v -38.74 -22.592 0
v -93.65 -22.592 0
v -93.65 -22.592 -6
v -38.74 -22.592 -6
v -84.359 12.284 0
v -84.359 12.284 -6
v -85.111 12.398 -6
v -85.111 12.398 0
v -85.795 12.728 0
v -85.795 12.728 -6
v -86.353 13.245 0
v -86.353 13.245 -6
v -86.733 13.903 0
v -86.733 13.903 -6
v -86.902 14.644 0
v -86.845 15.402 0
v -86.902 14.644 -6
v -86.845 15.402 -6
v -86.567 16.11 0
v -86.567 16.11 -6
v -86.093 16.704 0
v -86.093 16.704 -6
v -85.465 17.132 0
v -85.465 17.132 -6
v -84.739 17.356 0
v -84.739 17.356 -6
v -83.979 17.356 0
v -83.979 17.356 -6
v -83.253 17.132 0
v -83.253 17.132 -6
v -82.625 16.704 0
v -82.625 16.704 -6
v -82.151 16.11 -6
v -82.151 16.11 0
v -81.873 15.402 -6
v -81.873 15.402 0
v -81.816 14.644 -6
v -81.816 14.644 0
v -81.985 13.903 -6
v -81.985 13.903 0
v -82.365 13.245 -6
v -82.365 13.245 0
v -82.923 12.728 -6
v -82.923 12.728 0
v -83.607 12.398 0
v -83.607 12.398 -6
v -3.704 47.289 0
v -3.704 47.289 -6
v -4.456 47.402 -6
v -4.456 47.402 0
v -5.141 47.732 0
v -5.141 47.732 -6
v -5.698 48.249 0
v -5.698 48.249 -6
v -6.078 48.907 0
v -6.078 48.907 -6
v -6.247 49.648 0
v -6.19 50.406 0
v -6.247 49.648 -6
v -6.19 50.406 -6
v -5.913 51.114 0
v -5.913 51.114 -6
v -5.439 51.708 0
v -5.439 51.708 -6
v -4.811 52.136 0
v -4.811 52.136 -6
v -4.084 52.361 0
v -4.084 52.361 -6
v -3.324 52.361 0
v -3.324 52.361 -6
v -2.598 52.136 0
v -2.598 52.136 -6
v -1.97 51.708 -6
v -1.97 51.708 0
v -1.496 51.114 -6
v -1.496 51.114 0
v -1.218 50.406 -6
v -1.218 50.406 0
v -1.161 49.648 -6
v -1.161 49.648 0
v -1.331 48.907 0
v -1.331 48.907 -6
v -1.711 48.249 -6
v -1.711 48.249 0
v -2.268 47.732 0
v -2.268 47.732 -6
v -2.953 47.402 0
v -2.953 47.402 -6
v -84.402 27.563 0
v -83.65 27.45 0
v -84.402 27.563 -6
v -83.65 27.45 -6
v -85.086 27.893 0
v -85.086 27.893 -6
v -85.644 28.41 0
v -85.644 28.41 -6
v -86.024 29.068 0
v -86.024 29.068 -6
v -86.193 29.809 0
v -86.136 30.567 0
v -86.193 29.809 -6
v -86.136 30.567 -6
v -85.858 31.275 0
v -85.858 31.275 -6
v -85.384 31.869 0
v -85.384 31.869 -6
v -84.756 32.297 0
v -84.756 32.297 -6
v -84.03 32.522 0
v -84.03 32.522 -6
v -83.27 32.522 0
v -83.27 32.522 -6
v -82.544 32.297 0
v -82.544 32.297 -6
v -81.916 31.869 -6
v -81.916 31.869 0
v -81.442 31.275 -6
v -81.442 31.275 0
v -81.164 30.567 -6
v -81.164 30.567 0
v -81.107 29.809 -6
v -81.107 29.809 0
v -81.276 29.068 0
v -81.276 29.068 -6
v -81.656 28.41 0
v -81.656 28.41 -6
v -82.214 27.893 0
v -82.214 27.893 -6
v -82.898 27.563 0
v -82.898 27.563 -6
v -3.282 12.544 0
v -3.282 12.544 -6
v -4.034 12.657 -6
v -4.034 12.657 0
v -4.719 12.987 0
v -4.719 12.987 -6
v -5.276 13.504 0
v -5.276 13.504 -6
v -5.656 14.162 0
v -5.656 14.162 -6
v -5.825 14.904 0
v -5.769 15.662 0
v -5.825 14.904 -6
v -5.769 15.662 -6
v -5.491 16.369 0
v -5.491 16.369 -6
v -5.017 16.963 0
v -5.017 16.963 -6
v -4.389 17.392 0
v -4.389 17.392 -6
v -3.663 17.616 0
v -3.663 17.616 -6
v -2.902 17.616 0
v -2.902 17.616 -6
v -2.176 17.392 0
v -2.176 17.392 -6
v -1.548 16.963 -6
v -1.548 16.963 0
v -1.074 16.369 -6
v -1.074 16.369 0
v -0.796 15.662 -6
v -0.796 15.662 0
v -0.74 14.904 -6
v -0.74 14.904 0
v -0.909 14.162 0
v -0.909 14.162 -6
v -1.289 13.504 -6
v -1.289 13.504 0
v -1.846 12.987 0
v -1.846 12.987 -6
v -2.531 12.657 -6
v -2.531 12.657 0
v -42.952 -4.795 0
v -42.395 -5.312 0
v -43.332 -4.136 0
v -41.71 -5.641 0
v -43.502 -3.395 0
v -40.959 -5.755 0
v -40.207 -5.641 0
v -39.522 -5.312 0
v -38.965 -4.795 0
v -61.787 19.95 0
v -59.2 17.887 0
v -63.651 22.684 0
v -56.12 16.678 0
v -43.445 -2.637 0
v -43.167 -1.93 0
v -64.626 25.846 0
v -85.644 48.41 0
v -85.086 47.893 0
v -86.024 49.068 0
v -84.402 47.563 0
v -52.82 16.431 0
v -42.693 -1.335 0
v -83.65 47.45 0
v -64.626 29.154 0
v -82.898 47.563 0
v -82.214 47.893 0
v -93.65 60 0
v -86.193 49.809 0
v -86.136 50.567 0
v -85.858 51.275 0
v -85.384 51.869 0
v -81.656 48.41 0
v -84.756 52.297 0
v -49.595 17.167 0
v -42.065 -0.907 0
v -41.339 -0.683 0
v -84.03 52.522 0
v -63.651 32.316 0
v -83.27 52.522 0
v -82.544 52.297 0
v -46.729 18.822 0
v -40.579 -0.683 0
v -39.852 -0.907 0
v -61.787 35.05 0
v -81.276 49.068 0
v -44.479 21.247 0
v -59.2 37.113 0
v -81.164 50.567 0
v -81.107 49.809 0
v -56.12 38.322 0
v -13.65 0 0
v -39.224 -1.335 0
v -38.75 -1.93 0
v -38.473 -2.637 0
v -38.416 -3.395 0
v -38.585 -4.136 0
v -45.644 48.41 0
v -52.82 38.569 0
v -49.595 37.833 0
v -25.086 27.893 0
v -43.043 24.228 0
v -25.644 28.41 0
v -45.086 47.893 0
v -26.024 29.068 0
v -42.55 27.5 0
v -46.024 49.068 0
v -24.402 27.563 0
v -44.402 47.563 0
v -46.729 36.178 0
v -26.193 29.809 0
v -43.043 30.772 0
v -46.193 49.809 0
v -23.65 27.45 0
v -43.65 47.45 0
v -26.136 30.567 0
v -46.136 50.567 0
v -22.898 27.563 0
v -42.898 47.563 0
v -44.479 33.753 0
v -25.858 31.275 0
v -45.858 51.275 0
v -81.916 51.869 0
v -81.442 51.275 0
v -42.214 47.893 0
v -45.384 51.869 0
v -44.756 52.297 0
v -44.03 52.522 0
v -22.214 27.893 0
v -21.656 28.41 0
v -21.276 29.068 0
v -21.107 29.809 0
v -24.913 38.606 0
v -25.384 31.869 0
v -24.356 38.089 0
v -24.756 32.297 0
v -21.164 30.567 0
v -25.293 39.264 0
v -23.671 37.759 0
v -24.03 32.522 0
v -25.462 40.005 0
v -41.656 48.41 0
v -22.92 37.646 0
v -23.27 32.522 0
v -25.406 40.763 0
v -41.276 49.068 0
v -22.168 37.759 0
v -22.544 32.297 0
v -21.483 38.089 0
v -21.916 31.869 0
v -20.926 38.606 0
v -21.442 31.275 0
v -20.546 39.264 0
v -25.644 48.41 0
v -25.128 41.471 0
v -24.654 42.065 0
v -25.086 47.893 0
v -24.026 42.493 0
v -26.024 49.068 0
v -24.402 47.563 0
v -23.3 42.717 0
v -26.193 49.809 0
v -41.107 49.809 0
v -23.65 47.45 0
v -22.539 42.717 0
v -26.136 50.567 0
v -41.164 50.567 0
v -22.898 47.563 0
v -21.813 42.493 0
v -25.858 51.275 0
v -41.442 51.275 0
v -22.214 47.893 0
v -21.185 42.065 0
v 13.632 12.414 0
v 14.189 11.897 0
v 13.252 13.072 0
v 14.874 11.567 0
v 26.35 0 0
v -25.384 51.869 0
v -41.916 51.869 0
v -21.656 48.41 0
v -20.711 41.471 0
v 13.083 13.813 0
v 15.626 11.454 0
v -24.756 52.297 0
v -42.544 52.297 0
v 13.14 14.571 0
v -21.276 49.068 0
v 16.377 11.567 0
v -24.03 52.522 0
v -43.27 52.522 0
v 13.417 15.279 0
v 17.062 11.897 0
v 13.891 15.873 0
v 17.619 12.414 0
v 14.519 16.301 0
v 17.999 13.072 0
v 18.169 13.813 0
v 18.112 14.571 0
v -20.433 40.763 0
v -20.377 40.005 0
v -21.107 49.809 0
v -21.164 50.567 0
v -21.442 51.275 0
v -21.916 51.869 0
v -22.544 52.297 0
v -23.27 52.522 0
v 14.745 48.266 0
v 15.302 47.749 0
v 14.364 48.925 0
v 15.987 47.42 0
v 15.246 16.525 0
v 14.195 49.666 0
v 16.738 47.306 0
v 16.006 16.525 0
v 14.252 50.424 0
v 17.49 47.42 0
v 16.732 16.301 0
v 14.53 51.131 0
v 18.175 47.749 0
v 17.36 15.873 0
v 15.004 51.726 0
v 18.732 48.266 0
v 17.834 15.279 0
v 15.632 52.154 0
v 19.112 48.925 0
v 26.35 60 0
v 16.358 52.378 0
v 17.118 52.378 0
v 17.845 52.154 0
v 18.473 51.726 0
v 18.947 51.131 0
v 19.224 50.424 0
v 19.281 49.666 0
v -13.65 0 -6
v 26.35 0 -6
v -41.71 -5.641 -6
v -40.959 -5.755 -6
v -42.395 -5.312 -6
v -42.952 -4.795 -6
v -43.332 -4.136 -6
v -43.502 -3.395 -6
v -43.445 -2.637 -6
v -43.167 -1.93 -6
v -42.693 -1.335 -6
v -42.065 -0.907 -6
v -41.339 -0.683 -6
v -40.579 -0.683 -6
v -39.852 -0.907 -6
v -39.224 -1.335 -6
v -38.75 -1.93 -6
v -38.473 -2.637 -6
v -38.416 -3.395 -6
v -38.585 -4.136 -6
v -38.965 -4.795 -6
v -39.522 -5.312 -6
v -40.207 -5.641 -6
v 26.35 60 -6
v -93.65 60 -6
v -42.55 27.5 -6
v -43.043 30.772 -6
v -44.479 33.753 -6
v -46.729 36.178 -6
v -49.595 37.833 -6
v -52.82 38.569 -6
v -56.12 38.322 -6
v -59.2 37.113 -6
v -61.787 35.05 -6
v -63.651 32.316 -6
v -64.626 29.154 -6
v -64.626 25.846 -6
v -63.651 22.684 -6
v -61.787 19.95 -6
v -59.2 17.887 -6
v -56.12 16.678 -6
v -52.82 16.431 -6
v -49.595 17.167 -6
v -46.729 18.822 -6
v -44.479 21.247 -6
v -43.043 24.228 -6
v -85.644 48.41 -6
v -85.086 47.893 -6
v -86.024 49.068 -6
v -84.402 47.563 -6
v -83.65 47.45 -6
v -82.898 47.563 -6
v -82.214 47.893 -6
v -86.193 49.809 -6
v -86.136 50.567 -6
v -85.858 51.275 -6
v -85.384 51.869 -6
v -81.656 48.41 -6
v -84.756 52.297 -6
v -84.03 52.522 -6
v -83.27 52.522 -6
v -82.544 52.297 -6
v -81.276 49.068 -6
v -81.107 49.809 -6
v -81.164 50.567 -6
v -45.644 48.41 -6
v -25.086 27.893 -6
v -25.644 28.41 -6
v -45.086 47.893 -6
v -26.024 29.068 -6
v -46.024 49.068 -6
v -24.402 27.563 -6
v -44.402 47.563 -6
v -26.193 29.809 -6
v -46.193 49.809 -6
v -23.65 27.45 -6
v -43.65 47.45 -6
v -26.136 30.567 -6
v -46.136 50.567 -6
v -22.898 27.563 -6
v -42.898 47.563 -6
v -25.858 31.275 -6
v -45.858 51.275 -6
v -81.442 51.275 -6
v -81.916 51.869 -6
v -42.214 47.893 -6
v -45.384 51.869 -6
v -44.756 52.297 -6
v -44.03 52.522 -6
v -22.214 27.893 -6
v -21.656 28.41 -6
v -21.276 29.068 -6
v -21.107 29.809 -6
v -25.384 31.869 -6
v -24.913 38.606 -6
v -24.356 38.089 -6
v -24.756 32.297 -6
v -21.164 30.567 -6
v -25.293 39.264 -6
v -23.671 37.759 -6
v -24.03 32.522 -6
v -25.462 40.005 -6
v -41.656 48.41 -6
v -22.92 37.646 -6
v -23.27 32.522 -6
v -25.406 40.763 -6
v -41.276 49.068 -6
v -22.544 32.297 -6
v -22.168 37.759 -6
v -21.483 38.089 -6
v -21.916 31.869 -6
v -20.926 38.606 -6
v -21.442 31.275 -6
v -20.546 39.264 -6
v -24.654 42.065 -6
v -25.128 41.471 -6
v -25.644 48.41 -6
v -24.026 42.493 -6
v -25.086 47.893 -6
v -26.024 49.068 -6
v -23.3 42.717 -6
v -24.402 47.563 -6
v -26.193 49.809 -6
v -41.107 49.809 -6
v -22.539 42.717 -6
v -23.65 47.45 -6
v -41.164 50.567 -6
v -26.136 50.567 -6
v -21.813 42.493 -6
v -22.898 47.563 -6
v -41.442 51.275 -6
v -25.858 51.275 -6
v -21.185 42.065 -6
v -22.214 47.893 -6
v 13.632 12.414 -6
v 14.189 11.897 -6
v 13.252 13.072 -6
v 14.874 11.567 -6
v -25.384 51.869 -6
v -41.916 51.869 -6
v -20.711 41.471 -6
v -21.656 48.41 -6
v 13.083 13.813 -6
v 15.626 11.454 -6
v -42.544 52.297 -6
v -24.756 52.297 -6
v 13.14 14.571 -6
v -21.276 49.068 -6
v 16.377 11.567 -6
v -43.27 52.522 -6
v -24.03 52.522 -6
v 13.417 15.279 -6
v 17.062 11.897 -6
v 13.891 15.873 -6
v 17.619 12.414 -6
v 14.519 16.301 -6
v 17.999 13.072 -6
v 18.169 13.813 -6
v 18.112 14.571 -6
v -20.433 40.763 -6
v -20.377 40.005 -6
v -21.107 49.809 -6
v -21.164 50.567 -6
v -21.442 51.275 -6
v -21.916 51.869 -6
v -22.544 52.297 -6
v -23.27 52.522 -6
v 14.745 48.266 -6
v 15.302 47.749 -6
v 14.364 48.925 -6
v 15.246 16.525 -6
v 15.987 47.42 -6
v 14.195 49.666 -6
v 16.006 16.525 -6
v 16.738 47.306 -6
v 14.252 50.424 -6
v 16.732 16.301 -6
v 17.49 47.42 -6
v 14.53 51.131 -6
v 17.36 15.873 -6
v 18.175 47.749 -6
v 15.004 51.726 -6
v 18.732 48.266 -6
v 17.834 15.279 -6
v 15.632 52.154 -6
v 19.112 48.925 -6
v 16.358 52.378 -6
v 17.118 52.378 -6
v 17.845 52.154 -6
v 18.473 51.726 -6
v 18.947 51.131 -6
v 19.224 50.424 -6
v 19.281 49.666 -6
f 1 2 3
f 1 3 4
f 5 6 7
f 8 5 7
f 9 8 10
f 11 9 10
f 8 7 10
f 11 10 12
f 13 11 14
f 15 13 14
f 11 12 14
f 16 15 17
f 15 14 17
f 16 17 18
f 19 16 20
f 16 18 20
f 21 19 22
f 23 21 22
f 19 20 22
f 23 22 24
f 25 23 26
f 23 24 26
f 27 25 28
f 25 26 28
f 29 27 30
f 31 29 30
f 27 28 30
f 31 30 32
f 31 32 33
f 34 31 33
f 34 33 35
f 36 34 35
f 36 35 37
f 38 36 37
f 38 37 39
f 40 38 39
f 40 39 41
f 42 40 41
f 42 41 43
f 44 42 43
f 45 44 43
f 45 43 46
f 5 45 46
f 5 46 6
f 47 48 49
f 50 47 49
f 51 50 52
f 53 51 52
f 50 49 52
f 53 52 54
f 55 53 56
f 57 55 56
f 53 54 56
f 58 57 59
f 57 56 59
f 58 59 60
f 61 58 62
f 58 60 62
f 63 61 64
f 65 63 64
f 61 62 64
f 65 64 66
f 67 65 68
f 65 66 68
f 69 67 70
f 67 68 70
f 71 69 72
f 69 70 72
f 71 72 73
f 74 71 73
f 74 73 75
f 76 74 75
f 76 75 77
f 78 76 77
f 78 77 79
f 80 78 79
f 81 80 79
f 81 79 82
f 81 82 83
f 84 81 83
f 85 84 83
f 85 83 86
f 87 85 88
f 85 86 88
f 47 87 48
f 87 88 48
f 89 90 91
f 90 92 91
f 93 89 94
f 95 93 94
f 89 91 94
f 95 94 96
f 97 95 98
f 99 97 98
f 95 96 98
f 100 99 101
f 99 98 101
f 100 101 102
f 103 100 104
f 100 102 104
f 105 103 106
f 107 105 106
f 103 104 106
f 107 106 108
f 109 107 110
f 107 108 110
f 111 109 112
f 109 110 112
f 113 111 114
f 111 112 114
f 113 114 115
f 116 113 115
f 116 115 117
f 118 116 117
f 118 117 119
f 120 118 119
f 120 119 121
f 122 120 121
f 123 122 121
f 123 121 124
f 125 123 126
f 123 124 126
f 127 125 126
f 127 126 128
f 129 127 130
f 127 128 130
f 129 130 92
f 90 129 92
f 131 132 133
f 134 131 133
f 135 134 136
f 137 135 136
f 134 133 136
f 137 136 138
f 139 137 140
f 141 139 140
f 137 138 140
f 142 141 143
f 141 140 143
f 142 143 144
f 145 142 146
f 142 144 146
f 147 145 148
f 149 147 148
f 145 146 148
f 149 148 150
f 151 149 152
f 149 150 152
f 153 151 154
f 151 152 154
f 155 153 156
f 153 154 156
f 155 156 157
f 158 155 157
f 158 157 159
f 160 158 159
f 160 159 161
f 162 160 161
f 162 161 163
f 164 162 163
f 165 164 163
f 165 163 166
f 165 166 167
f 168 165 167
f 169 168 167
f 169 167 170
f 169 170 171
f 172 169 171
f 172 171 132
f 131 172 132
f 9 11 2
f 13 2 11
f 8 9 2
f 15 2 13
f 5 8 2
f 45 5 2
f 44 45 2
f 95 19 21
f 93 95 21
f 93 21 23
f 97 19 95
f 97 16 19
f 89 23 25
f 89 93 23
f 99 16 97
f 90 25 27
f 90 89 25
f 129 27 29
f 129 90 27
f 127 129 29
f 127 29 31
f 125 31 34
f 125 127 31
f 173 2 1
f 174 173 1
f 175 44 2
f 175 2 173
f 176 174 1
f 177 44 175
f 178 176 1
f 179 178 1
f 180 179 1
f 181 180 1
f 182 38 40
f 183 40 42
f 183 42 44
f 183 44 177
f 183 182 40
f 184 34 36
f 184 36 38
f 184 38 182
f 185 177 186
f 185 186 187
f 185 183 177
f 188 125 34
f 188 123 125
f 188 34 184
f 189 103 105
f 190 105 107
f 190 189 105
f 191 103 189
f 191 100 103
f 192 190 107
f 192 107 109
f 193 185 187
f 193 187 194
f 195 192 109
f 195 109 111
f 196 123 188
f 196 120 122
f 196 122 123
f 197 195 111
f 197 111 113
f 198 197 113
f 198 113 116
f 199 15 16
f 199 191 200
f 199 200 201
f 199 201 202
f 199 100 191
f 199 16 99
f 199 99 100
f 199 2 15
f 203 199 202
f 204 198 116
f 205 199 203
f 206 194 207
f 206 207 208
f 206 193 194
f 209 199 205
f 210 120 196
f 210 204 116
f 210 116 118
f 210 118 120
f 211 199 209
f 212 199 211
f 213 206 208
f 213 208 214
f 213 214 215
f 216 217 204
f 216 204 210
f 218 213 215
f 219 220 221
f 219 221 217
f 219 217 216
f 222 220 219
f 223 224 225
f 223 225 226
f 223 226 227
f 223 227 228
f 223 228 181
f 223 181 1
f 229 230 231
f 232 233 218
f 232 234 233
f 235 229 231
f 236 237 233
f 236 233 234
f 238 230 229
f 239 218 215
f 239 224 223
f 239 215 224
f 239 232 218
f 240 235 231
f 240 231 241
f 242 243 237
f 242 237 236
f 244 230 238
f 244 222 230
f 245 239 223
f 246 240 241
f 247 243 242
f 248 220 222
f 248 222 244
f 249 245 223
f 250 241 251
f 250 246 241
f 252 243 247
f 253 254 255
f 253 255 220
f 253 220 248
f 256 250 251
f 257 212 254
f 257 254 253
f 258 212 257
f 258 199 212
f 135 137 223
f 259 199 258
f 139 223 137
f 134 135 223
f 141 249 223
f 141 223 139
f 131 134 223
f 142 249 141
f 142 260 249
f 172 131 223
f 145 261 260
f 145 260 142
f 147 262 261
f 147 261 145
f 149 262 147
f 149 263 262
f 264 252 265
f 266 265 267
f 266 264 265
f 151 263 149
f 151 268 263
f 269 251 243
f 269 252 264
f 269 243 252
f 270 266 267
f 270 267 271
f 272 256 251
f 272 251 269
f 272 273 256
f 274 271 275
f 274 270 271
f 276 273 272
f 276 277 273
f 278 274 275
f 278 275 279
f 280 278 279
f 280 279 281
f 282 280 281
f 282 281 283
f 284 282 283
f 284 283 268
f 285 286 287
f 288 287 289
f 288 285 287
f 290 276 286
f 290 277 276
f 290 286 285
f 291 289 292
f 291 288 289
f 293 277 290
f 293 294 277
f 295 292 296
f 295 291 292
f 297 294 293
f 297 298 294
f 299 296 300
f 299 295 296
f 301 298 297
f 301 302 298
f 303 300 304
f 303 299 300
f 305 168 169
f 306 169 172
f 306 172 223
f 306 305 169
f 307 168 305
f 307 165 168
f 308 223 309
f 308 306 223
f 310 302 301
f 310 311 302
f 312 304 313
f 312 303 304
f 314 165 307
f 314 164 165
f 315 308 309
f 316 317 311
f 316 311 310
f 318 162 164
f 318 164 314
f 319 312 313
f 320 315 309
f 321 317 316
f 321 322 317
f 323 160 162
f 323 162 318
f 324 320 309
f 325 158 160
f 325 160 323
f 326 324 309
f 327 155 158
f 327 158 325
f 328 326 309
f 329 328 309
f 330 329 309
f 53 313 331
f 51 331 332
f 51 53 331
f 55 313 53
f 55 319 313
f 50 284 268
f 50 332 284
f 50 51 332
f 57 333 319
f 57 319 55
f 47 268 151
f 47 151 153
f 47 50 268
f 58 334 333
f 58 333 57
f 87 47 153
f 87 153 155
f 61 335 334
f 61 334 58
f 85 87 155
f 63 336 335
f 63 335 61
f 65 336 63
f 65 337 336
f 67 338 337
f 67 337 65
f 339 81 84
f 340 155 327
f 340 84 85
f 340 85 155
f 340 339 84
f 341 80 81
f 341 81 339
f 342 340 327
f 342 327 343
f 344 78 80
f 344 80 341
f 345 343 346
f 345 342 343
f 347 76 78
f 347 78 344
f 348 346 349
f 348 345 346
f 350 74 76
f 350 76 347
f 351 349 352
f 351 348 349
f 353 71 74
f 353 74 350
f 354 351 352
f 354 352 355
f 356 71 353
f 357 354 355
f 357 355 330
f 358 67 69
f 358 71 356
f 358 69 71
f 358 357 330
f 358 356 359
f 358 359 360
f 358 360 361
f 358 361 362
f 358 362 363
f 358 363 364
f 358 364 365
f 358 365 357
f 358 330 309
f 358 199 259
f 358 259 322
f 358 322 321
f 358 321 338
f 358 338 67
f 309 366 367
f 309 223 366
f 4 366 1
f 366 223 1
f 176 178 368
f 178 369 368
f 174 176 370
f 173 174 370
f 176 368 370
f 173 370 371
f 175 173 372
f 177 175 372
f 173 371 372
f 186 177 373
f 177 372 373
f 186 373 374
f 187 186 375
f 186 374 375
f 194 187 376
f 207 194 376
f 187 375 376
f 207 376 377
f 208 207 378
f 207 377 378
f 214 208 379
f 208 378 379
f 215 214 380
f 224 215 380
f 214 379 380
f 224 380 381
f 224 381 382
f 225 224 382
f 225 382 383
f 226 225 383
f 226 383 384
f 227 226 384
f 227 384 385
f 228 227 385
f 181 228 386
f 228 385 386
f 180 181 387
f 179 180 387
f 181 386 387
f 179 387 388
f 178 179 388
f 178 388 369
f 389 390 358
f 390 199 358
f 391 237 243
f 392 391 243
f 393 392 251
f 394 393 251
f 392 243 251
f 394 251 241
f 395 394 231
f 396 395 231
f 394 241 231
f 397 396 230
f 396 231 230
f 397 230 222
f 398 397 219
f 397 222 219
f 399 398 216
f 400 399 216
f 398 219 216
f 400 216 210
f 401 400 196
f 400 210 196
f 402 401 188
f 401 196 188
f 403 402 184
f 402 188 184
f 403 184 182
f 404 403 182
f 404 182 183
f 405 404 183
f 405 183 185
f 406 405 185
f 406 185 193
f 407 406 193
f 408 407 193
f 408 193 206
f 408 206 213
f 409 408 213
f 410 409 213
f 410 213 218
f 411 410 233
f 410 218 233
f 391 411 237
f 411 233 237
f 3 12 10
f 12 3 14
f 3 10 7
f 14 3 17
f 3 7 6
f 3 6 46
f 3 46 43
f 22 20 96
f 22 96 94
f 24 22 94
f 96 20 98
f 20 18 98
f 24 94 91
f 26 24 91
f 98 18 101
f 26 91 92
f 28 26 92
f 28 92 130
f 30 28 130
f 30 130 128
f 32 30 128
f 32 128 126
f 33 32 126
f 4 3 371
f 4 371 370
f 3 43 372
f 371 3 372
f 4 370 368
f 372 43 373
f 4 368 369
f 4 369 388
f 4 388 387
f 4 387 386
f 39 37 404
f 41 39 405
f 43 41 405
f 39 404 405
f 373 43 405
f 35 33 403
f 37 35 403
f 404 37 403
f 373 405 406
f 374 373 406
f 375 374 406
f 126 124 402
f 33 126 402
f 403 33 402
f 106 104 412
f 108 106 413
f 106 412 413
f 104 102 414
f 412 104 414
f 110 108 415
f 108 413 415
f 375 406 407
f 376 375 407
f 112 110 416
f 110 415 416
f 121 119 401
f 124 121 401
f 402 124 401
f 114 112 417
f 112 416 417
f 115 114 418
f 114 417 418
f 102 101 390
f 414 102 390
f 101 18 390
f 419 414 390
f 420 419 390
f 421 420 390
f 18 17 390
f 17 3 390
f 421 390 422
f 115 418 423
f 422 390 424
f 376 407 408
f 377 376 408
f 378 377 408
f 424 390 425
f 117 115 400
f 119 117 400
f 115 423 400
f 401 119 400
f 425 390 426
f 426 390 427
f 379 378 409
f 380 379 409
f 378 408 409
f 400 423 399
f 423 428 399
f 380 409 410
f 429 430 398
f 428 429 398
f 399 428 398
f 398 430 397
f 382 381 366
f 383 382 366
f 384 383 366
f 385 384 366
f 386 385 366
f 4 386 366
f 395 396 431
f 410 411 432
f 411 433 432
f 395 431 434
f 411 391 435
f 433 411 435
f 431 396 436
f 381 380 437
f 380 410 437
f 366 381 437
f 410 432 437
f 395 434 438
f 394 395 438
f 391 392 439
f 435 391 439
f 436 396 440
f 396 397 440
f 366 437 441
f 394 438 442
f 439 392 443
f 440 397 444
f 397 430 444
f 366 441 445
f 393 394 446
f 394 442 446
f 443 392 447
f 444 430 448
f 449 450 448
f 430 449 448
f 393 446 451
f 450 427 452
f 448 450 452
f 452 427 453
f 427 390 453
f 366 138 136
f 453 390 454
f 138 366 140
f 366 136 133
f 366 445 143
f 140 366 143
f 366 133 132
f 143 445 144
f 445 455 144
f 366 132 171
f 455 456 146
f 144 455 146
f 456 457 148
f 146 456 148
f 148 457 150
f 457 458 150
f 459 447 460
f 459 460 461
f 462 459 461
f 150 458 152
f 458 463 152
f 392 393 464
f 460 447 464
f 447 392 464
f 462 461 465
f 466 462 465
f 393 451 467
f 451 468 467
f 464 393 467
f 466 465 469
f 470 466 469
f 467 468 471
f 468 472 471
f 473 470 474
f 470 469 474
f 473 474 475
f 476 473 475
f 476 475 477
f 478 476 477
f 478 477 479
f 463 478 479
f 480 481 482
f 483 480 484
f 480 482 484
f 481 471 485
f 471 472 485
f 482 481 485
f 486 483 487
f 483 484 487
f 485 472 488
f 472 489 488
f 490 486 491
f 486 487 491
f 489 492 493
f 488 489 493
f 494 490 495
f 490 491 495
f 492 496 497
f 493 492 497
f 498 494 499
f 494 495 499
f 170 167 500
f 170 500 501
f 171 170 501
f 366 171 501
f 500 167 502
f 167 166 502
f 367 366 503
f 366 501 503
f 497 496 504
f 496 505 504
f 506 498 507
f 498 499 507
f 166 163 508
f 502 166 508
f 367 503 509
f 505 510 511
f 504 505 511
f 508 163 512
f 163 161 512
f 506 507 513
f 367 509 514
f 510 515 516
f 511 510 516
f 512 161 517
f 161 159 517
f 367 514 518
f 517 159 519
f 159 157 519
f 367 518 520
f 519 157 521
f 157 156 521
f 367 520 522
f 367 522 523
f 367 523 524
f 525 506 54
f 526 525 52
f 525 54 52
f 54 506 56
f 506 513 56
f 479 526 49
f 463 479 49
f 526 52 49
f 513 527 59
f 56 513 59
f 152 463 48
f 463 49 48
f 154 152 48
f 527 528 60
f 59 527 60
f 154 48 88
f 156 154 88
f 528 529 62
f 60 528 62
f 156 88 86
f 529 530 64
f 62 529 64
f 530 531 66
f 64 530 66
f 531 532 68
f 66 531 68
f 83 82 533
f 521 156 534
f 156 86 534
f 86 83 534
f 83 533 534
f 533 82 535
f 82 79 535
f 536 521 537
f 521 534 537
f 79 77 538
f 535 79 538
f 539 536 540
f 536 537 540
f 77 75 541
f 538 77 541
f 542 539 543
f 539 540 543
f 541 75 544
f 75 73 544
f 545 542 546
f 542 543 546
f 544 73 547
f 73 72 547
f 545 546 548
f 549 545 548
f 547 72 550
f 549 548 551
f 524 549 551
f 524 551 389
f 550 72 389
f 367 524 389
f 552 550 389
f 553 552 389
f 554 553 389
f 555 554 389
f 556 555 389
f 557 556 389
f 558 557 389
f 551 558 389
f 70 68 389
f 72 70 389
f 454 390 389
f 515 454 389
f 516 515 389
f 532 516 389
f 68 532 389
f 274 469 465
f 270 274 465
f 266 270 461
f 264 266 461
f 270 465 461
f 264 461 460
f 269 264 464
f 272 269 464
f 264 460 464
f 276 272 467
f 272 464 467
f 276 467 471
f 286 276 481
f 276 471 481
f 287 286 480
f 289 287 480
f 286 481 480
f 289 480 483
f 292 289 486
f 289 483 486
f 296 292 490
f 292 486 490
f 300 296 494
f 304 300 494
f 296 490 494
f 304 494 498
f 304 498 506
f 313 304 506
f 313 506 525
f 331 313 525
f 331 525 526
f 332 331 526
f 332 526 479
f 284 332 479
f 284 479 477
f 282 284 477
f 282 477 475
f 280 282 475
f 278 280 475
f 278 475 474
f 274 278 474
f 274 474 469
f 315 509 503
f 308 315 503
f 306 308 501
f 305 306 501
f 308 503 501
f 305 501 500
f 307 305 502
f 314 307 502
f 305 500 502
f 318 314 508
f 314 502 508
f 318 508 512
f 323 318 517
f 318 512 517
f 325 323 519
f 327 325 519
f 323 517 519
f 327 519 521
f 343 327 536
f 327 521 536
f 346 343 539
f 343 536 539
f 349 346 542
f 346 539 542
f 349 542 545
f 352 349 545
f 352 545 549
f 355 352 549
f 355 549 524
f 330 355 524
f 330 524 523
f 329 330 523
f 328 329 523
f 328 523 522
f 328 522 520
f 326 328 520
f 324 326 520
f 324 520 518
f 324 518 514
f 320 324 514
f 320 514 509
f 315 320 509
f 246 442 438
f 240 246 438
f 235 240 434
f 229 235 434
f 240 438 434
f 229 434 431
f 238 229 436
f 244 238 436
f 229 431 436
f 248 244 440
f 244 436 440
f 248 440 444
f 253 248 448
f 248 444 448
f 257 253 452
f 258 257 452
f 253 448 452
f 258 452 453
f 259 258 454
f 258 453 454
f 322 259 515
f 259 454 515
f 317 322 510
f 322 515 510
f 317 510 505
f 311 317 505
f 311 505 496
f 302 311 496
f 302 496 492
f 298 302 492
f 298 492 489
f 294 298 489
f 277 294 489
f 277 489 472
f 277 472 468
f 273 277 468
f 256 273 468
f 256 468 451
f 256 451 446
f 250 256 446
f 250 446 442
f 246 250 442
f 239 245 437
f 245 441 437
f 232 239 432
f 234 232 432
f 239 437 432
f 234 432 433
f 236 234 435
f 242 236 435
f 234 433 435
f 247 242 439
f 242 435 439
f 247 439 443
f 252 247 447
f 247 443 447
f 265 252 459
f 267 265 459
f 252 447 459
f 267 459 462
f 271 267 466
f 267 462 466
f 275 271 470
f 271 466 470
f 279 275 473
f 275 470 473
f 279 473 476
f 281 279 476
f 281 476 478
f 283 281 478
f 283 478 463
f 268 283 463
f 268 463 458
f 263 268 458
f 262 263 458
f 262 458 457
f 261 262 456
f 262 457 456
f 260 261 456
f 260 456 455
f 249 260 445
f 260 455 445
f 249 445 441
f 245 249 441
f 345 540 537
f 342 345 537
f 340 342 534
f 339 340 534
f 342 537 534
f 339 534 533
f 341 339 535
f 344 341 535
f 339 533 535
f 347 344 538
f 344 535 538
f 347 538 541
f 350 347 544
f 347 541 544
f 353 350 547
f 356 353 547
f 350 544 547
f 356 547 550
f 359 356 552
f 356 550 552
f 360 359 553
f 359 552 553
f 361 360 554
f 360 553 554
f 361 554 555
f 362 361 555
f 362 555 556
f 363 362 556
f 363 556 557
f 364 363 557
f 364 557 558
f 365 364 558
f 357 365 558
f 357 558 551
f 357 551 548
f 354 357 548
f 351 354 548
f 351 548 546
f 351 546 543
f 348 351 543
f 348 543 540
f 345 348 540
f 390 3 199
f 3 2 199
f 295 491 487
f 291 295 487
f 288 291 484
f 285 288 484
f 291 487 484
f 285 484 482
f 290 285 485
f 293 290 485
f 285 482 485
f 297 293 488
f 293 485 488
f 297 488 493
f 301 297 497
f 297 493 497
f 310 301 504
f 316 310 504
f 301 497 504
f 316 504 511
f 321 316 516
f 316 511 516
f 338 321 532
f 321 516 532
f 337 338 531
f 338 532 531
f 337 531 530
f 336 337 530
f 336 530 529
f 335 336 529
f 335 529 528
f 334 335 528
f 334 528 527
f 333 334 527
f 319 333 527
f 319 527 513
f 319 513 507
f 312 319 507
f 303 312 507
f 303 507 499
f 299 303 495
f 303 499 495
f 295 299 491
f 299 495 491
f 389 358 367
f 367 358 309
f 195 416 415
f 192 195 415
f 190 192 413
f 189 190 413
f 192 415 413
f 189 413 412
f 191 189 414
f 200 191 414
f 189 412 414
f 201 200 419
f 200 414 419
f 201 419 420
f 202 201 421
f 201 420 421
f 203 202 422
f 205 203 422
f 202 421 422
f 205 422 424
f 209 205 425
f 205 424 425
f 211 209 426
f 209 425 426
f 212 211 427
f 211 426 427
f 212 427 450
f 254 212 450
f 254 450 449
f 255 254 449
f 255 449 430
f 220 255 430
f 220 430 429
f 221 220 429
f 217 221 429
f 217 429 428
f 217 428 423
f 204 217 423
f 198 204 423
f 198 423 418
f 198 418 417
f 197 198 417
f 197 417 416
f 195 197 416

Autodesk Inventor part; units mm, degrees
ref_plane "YZ Plane" through (0, 0, 0) normal (1, 0, 0) x (0, 1, 0)
ref_plane "XZ Plane" through (0, 0, 0) normal (0, 1, 0) x (-1, 0, 0)
ref_plane "XY Plane" through (0, 0, 0) normal (0, 0, 1) x (1, 0, 0)
sketch "Sketch1" plane through (0, 0, 0) normal (0, 0, 1) x (1, 0, 0)
  circle A0 centre (-83.65, 30) radius 2.1 projected
  circle A1 centre (-23.65, 30) radius 2.1 projected
  circle A2 centre (-23.65, 50) radius 2.1 projected
  circle A3 centre (-83.65, 50) radius 2.1 projected
  line L0 (-3.55, 0) -> (-3.5497, 1000) projected
  line L1 (16.25, 0) -> (16.2503, 1000) projected
  line L2 (-93.65, 20.5) -> (-93.65, 25.1685) projected
  line L3 (-73.65, 25.1685) -> (-73.65, 20.5) projected
  line L4 (-78.75, 60) -> (-68.55, 60) projected
  line L5 (-88.55, 20) -> (-93.15, 20) projected
  line L6 (-93.65, 20) -> (-93.65, 60)
  line L7 (-93.65, 60) -> (26.35, 60)
  line L8 (26.35, 60) -> (26.35, 0)
  line L9 (26.35, 0) -> (-3.55, 0)
  line L10 (-93.65, -22.5923) -> (-93.65, 20)
  line L11 (-74.15, 20) -> (-78.75, 20) construction
  line L12 (-33.65, 20.5) -> (-33.65, 25.1685) projected
  line L13 (-53.65, -43.196) -> (-53.65, 110.7641) construction
  line L14 (-13.65, 0) -> (-38.74, -22.5923)
  circle A4 centre (-53.65, 27.5) radius 11.1
  circle A5 centre (-43.65, 50) radius 2.1 projected
  line L15 (-93.65, -22.5923) -> (-38.74, -22.5923)
  line L16 (-13.65, 0) -> (-3.55, 0)
  point P0 (0, 0)
  point P1 (-62.8644, -22.5923)
  point P2 (-93.65, -24.4136)
  point P3 (-3.55, 15)
  point P4 (-3.55, 50)
  point P5 (16.25, 50)
  point P6 (16.25, 15)
  dimension "d0" = 120
  dimension "d1" = 40
  dimension "d5" = 20
  dimension "d36" = 22.2
  dimension "d37" = 32.5
  dimension "d45" = 15
  dimension "d47" = 50
  dimension "d48" = 50
  dimension "d79" = 15
extrude "Extrusion2" add sketch "Sketch1" against normal blind 6 contours A0 | A1 | A2 | A3 | L16 L14 L15 L10 L6 L2 L7 L4 L0 | L0 L7 L1 L9 | L1 L7 L8 L9 | A5
ref_plane "Work Plane1" through (0, 0, 5) normal (0, 0, 1) x (1, 0, 0)
sketch "Sketch2" plane through (0, 0, 5) normal (0, 0, 1) x (1, 0, 0)
  line L0 (-66.3198, 58.2348) -> (-84.359, 14.8345) construction
  line L1 (-84.359, 14.8345) -> (-40.9587, -3.2047) construction
  line L2 (-40.9587, -3.2047) -> (-22.9195, 40.1957) construction
  line L3 (-22.9195, 40.1957) -> (-66.3198, 58.2348) construction
  line L4 (-66.3198, 58.2348) -> (-40.9587, -3.2047) construction
  line L5 (-84.359, 14.8345) -> (-22.9195, 40.1957) construction
  circle A0 centre (-22.9195, 40.1957) radius 4.6 construction
  circle A1 centre (-84.359, 14.8345) radius 4.6 construction
  point P0 (0, 0)
  point P1 (-53.6392, 27.5151)
  dimension "d41" = 47
  dimension "d42" = 47
  dimension "d43" = 9.2
  dimension "d44" = 9.2
hole "Hole2" at (-84.359, 14.8345, 5) at (-22.9195, 40.1957, 5) at (-40.9587, -3.2047, 5) direction (0, 0, -1) diameter 5.1 end through all
hole "Hole3" at (-53.65, 27.5, 0) at (-43.65, 50, 0) at (-23.65, 50, 0) at (-23.65, 30, 0) at (-83.65, 50, 0) at (-83.65, 30, 0) direction (0, 0, -1) diameter 5.1 end through all
sketch "Sketch3" plane through (0, 0, 0) normal (0, 0, 1) x (1, 0, 0)
  point P0 (0, 0)
  point P1 (-3.2825, 15.0941)
  point P2 (-3.7043, 49.839)
  point P3 (16.7382, 49.8563)
  point P4 (15.6257, 14.0035)
hole "Hole4" at (-3.2825, 15.0941, 0) at (-3.7043, 49.839, 0) at (16.7382, 49.8563, 0) at (15.6257, 14.0035, 0) direction (0, 0, -1) diameter 5.1 end through all
properties part number "Y axis motor mount new_3DPrint"
